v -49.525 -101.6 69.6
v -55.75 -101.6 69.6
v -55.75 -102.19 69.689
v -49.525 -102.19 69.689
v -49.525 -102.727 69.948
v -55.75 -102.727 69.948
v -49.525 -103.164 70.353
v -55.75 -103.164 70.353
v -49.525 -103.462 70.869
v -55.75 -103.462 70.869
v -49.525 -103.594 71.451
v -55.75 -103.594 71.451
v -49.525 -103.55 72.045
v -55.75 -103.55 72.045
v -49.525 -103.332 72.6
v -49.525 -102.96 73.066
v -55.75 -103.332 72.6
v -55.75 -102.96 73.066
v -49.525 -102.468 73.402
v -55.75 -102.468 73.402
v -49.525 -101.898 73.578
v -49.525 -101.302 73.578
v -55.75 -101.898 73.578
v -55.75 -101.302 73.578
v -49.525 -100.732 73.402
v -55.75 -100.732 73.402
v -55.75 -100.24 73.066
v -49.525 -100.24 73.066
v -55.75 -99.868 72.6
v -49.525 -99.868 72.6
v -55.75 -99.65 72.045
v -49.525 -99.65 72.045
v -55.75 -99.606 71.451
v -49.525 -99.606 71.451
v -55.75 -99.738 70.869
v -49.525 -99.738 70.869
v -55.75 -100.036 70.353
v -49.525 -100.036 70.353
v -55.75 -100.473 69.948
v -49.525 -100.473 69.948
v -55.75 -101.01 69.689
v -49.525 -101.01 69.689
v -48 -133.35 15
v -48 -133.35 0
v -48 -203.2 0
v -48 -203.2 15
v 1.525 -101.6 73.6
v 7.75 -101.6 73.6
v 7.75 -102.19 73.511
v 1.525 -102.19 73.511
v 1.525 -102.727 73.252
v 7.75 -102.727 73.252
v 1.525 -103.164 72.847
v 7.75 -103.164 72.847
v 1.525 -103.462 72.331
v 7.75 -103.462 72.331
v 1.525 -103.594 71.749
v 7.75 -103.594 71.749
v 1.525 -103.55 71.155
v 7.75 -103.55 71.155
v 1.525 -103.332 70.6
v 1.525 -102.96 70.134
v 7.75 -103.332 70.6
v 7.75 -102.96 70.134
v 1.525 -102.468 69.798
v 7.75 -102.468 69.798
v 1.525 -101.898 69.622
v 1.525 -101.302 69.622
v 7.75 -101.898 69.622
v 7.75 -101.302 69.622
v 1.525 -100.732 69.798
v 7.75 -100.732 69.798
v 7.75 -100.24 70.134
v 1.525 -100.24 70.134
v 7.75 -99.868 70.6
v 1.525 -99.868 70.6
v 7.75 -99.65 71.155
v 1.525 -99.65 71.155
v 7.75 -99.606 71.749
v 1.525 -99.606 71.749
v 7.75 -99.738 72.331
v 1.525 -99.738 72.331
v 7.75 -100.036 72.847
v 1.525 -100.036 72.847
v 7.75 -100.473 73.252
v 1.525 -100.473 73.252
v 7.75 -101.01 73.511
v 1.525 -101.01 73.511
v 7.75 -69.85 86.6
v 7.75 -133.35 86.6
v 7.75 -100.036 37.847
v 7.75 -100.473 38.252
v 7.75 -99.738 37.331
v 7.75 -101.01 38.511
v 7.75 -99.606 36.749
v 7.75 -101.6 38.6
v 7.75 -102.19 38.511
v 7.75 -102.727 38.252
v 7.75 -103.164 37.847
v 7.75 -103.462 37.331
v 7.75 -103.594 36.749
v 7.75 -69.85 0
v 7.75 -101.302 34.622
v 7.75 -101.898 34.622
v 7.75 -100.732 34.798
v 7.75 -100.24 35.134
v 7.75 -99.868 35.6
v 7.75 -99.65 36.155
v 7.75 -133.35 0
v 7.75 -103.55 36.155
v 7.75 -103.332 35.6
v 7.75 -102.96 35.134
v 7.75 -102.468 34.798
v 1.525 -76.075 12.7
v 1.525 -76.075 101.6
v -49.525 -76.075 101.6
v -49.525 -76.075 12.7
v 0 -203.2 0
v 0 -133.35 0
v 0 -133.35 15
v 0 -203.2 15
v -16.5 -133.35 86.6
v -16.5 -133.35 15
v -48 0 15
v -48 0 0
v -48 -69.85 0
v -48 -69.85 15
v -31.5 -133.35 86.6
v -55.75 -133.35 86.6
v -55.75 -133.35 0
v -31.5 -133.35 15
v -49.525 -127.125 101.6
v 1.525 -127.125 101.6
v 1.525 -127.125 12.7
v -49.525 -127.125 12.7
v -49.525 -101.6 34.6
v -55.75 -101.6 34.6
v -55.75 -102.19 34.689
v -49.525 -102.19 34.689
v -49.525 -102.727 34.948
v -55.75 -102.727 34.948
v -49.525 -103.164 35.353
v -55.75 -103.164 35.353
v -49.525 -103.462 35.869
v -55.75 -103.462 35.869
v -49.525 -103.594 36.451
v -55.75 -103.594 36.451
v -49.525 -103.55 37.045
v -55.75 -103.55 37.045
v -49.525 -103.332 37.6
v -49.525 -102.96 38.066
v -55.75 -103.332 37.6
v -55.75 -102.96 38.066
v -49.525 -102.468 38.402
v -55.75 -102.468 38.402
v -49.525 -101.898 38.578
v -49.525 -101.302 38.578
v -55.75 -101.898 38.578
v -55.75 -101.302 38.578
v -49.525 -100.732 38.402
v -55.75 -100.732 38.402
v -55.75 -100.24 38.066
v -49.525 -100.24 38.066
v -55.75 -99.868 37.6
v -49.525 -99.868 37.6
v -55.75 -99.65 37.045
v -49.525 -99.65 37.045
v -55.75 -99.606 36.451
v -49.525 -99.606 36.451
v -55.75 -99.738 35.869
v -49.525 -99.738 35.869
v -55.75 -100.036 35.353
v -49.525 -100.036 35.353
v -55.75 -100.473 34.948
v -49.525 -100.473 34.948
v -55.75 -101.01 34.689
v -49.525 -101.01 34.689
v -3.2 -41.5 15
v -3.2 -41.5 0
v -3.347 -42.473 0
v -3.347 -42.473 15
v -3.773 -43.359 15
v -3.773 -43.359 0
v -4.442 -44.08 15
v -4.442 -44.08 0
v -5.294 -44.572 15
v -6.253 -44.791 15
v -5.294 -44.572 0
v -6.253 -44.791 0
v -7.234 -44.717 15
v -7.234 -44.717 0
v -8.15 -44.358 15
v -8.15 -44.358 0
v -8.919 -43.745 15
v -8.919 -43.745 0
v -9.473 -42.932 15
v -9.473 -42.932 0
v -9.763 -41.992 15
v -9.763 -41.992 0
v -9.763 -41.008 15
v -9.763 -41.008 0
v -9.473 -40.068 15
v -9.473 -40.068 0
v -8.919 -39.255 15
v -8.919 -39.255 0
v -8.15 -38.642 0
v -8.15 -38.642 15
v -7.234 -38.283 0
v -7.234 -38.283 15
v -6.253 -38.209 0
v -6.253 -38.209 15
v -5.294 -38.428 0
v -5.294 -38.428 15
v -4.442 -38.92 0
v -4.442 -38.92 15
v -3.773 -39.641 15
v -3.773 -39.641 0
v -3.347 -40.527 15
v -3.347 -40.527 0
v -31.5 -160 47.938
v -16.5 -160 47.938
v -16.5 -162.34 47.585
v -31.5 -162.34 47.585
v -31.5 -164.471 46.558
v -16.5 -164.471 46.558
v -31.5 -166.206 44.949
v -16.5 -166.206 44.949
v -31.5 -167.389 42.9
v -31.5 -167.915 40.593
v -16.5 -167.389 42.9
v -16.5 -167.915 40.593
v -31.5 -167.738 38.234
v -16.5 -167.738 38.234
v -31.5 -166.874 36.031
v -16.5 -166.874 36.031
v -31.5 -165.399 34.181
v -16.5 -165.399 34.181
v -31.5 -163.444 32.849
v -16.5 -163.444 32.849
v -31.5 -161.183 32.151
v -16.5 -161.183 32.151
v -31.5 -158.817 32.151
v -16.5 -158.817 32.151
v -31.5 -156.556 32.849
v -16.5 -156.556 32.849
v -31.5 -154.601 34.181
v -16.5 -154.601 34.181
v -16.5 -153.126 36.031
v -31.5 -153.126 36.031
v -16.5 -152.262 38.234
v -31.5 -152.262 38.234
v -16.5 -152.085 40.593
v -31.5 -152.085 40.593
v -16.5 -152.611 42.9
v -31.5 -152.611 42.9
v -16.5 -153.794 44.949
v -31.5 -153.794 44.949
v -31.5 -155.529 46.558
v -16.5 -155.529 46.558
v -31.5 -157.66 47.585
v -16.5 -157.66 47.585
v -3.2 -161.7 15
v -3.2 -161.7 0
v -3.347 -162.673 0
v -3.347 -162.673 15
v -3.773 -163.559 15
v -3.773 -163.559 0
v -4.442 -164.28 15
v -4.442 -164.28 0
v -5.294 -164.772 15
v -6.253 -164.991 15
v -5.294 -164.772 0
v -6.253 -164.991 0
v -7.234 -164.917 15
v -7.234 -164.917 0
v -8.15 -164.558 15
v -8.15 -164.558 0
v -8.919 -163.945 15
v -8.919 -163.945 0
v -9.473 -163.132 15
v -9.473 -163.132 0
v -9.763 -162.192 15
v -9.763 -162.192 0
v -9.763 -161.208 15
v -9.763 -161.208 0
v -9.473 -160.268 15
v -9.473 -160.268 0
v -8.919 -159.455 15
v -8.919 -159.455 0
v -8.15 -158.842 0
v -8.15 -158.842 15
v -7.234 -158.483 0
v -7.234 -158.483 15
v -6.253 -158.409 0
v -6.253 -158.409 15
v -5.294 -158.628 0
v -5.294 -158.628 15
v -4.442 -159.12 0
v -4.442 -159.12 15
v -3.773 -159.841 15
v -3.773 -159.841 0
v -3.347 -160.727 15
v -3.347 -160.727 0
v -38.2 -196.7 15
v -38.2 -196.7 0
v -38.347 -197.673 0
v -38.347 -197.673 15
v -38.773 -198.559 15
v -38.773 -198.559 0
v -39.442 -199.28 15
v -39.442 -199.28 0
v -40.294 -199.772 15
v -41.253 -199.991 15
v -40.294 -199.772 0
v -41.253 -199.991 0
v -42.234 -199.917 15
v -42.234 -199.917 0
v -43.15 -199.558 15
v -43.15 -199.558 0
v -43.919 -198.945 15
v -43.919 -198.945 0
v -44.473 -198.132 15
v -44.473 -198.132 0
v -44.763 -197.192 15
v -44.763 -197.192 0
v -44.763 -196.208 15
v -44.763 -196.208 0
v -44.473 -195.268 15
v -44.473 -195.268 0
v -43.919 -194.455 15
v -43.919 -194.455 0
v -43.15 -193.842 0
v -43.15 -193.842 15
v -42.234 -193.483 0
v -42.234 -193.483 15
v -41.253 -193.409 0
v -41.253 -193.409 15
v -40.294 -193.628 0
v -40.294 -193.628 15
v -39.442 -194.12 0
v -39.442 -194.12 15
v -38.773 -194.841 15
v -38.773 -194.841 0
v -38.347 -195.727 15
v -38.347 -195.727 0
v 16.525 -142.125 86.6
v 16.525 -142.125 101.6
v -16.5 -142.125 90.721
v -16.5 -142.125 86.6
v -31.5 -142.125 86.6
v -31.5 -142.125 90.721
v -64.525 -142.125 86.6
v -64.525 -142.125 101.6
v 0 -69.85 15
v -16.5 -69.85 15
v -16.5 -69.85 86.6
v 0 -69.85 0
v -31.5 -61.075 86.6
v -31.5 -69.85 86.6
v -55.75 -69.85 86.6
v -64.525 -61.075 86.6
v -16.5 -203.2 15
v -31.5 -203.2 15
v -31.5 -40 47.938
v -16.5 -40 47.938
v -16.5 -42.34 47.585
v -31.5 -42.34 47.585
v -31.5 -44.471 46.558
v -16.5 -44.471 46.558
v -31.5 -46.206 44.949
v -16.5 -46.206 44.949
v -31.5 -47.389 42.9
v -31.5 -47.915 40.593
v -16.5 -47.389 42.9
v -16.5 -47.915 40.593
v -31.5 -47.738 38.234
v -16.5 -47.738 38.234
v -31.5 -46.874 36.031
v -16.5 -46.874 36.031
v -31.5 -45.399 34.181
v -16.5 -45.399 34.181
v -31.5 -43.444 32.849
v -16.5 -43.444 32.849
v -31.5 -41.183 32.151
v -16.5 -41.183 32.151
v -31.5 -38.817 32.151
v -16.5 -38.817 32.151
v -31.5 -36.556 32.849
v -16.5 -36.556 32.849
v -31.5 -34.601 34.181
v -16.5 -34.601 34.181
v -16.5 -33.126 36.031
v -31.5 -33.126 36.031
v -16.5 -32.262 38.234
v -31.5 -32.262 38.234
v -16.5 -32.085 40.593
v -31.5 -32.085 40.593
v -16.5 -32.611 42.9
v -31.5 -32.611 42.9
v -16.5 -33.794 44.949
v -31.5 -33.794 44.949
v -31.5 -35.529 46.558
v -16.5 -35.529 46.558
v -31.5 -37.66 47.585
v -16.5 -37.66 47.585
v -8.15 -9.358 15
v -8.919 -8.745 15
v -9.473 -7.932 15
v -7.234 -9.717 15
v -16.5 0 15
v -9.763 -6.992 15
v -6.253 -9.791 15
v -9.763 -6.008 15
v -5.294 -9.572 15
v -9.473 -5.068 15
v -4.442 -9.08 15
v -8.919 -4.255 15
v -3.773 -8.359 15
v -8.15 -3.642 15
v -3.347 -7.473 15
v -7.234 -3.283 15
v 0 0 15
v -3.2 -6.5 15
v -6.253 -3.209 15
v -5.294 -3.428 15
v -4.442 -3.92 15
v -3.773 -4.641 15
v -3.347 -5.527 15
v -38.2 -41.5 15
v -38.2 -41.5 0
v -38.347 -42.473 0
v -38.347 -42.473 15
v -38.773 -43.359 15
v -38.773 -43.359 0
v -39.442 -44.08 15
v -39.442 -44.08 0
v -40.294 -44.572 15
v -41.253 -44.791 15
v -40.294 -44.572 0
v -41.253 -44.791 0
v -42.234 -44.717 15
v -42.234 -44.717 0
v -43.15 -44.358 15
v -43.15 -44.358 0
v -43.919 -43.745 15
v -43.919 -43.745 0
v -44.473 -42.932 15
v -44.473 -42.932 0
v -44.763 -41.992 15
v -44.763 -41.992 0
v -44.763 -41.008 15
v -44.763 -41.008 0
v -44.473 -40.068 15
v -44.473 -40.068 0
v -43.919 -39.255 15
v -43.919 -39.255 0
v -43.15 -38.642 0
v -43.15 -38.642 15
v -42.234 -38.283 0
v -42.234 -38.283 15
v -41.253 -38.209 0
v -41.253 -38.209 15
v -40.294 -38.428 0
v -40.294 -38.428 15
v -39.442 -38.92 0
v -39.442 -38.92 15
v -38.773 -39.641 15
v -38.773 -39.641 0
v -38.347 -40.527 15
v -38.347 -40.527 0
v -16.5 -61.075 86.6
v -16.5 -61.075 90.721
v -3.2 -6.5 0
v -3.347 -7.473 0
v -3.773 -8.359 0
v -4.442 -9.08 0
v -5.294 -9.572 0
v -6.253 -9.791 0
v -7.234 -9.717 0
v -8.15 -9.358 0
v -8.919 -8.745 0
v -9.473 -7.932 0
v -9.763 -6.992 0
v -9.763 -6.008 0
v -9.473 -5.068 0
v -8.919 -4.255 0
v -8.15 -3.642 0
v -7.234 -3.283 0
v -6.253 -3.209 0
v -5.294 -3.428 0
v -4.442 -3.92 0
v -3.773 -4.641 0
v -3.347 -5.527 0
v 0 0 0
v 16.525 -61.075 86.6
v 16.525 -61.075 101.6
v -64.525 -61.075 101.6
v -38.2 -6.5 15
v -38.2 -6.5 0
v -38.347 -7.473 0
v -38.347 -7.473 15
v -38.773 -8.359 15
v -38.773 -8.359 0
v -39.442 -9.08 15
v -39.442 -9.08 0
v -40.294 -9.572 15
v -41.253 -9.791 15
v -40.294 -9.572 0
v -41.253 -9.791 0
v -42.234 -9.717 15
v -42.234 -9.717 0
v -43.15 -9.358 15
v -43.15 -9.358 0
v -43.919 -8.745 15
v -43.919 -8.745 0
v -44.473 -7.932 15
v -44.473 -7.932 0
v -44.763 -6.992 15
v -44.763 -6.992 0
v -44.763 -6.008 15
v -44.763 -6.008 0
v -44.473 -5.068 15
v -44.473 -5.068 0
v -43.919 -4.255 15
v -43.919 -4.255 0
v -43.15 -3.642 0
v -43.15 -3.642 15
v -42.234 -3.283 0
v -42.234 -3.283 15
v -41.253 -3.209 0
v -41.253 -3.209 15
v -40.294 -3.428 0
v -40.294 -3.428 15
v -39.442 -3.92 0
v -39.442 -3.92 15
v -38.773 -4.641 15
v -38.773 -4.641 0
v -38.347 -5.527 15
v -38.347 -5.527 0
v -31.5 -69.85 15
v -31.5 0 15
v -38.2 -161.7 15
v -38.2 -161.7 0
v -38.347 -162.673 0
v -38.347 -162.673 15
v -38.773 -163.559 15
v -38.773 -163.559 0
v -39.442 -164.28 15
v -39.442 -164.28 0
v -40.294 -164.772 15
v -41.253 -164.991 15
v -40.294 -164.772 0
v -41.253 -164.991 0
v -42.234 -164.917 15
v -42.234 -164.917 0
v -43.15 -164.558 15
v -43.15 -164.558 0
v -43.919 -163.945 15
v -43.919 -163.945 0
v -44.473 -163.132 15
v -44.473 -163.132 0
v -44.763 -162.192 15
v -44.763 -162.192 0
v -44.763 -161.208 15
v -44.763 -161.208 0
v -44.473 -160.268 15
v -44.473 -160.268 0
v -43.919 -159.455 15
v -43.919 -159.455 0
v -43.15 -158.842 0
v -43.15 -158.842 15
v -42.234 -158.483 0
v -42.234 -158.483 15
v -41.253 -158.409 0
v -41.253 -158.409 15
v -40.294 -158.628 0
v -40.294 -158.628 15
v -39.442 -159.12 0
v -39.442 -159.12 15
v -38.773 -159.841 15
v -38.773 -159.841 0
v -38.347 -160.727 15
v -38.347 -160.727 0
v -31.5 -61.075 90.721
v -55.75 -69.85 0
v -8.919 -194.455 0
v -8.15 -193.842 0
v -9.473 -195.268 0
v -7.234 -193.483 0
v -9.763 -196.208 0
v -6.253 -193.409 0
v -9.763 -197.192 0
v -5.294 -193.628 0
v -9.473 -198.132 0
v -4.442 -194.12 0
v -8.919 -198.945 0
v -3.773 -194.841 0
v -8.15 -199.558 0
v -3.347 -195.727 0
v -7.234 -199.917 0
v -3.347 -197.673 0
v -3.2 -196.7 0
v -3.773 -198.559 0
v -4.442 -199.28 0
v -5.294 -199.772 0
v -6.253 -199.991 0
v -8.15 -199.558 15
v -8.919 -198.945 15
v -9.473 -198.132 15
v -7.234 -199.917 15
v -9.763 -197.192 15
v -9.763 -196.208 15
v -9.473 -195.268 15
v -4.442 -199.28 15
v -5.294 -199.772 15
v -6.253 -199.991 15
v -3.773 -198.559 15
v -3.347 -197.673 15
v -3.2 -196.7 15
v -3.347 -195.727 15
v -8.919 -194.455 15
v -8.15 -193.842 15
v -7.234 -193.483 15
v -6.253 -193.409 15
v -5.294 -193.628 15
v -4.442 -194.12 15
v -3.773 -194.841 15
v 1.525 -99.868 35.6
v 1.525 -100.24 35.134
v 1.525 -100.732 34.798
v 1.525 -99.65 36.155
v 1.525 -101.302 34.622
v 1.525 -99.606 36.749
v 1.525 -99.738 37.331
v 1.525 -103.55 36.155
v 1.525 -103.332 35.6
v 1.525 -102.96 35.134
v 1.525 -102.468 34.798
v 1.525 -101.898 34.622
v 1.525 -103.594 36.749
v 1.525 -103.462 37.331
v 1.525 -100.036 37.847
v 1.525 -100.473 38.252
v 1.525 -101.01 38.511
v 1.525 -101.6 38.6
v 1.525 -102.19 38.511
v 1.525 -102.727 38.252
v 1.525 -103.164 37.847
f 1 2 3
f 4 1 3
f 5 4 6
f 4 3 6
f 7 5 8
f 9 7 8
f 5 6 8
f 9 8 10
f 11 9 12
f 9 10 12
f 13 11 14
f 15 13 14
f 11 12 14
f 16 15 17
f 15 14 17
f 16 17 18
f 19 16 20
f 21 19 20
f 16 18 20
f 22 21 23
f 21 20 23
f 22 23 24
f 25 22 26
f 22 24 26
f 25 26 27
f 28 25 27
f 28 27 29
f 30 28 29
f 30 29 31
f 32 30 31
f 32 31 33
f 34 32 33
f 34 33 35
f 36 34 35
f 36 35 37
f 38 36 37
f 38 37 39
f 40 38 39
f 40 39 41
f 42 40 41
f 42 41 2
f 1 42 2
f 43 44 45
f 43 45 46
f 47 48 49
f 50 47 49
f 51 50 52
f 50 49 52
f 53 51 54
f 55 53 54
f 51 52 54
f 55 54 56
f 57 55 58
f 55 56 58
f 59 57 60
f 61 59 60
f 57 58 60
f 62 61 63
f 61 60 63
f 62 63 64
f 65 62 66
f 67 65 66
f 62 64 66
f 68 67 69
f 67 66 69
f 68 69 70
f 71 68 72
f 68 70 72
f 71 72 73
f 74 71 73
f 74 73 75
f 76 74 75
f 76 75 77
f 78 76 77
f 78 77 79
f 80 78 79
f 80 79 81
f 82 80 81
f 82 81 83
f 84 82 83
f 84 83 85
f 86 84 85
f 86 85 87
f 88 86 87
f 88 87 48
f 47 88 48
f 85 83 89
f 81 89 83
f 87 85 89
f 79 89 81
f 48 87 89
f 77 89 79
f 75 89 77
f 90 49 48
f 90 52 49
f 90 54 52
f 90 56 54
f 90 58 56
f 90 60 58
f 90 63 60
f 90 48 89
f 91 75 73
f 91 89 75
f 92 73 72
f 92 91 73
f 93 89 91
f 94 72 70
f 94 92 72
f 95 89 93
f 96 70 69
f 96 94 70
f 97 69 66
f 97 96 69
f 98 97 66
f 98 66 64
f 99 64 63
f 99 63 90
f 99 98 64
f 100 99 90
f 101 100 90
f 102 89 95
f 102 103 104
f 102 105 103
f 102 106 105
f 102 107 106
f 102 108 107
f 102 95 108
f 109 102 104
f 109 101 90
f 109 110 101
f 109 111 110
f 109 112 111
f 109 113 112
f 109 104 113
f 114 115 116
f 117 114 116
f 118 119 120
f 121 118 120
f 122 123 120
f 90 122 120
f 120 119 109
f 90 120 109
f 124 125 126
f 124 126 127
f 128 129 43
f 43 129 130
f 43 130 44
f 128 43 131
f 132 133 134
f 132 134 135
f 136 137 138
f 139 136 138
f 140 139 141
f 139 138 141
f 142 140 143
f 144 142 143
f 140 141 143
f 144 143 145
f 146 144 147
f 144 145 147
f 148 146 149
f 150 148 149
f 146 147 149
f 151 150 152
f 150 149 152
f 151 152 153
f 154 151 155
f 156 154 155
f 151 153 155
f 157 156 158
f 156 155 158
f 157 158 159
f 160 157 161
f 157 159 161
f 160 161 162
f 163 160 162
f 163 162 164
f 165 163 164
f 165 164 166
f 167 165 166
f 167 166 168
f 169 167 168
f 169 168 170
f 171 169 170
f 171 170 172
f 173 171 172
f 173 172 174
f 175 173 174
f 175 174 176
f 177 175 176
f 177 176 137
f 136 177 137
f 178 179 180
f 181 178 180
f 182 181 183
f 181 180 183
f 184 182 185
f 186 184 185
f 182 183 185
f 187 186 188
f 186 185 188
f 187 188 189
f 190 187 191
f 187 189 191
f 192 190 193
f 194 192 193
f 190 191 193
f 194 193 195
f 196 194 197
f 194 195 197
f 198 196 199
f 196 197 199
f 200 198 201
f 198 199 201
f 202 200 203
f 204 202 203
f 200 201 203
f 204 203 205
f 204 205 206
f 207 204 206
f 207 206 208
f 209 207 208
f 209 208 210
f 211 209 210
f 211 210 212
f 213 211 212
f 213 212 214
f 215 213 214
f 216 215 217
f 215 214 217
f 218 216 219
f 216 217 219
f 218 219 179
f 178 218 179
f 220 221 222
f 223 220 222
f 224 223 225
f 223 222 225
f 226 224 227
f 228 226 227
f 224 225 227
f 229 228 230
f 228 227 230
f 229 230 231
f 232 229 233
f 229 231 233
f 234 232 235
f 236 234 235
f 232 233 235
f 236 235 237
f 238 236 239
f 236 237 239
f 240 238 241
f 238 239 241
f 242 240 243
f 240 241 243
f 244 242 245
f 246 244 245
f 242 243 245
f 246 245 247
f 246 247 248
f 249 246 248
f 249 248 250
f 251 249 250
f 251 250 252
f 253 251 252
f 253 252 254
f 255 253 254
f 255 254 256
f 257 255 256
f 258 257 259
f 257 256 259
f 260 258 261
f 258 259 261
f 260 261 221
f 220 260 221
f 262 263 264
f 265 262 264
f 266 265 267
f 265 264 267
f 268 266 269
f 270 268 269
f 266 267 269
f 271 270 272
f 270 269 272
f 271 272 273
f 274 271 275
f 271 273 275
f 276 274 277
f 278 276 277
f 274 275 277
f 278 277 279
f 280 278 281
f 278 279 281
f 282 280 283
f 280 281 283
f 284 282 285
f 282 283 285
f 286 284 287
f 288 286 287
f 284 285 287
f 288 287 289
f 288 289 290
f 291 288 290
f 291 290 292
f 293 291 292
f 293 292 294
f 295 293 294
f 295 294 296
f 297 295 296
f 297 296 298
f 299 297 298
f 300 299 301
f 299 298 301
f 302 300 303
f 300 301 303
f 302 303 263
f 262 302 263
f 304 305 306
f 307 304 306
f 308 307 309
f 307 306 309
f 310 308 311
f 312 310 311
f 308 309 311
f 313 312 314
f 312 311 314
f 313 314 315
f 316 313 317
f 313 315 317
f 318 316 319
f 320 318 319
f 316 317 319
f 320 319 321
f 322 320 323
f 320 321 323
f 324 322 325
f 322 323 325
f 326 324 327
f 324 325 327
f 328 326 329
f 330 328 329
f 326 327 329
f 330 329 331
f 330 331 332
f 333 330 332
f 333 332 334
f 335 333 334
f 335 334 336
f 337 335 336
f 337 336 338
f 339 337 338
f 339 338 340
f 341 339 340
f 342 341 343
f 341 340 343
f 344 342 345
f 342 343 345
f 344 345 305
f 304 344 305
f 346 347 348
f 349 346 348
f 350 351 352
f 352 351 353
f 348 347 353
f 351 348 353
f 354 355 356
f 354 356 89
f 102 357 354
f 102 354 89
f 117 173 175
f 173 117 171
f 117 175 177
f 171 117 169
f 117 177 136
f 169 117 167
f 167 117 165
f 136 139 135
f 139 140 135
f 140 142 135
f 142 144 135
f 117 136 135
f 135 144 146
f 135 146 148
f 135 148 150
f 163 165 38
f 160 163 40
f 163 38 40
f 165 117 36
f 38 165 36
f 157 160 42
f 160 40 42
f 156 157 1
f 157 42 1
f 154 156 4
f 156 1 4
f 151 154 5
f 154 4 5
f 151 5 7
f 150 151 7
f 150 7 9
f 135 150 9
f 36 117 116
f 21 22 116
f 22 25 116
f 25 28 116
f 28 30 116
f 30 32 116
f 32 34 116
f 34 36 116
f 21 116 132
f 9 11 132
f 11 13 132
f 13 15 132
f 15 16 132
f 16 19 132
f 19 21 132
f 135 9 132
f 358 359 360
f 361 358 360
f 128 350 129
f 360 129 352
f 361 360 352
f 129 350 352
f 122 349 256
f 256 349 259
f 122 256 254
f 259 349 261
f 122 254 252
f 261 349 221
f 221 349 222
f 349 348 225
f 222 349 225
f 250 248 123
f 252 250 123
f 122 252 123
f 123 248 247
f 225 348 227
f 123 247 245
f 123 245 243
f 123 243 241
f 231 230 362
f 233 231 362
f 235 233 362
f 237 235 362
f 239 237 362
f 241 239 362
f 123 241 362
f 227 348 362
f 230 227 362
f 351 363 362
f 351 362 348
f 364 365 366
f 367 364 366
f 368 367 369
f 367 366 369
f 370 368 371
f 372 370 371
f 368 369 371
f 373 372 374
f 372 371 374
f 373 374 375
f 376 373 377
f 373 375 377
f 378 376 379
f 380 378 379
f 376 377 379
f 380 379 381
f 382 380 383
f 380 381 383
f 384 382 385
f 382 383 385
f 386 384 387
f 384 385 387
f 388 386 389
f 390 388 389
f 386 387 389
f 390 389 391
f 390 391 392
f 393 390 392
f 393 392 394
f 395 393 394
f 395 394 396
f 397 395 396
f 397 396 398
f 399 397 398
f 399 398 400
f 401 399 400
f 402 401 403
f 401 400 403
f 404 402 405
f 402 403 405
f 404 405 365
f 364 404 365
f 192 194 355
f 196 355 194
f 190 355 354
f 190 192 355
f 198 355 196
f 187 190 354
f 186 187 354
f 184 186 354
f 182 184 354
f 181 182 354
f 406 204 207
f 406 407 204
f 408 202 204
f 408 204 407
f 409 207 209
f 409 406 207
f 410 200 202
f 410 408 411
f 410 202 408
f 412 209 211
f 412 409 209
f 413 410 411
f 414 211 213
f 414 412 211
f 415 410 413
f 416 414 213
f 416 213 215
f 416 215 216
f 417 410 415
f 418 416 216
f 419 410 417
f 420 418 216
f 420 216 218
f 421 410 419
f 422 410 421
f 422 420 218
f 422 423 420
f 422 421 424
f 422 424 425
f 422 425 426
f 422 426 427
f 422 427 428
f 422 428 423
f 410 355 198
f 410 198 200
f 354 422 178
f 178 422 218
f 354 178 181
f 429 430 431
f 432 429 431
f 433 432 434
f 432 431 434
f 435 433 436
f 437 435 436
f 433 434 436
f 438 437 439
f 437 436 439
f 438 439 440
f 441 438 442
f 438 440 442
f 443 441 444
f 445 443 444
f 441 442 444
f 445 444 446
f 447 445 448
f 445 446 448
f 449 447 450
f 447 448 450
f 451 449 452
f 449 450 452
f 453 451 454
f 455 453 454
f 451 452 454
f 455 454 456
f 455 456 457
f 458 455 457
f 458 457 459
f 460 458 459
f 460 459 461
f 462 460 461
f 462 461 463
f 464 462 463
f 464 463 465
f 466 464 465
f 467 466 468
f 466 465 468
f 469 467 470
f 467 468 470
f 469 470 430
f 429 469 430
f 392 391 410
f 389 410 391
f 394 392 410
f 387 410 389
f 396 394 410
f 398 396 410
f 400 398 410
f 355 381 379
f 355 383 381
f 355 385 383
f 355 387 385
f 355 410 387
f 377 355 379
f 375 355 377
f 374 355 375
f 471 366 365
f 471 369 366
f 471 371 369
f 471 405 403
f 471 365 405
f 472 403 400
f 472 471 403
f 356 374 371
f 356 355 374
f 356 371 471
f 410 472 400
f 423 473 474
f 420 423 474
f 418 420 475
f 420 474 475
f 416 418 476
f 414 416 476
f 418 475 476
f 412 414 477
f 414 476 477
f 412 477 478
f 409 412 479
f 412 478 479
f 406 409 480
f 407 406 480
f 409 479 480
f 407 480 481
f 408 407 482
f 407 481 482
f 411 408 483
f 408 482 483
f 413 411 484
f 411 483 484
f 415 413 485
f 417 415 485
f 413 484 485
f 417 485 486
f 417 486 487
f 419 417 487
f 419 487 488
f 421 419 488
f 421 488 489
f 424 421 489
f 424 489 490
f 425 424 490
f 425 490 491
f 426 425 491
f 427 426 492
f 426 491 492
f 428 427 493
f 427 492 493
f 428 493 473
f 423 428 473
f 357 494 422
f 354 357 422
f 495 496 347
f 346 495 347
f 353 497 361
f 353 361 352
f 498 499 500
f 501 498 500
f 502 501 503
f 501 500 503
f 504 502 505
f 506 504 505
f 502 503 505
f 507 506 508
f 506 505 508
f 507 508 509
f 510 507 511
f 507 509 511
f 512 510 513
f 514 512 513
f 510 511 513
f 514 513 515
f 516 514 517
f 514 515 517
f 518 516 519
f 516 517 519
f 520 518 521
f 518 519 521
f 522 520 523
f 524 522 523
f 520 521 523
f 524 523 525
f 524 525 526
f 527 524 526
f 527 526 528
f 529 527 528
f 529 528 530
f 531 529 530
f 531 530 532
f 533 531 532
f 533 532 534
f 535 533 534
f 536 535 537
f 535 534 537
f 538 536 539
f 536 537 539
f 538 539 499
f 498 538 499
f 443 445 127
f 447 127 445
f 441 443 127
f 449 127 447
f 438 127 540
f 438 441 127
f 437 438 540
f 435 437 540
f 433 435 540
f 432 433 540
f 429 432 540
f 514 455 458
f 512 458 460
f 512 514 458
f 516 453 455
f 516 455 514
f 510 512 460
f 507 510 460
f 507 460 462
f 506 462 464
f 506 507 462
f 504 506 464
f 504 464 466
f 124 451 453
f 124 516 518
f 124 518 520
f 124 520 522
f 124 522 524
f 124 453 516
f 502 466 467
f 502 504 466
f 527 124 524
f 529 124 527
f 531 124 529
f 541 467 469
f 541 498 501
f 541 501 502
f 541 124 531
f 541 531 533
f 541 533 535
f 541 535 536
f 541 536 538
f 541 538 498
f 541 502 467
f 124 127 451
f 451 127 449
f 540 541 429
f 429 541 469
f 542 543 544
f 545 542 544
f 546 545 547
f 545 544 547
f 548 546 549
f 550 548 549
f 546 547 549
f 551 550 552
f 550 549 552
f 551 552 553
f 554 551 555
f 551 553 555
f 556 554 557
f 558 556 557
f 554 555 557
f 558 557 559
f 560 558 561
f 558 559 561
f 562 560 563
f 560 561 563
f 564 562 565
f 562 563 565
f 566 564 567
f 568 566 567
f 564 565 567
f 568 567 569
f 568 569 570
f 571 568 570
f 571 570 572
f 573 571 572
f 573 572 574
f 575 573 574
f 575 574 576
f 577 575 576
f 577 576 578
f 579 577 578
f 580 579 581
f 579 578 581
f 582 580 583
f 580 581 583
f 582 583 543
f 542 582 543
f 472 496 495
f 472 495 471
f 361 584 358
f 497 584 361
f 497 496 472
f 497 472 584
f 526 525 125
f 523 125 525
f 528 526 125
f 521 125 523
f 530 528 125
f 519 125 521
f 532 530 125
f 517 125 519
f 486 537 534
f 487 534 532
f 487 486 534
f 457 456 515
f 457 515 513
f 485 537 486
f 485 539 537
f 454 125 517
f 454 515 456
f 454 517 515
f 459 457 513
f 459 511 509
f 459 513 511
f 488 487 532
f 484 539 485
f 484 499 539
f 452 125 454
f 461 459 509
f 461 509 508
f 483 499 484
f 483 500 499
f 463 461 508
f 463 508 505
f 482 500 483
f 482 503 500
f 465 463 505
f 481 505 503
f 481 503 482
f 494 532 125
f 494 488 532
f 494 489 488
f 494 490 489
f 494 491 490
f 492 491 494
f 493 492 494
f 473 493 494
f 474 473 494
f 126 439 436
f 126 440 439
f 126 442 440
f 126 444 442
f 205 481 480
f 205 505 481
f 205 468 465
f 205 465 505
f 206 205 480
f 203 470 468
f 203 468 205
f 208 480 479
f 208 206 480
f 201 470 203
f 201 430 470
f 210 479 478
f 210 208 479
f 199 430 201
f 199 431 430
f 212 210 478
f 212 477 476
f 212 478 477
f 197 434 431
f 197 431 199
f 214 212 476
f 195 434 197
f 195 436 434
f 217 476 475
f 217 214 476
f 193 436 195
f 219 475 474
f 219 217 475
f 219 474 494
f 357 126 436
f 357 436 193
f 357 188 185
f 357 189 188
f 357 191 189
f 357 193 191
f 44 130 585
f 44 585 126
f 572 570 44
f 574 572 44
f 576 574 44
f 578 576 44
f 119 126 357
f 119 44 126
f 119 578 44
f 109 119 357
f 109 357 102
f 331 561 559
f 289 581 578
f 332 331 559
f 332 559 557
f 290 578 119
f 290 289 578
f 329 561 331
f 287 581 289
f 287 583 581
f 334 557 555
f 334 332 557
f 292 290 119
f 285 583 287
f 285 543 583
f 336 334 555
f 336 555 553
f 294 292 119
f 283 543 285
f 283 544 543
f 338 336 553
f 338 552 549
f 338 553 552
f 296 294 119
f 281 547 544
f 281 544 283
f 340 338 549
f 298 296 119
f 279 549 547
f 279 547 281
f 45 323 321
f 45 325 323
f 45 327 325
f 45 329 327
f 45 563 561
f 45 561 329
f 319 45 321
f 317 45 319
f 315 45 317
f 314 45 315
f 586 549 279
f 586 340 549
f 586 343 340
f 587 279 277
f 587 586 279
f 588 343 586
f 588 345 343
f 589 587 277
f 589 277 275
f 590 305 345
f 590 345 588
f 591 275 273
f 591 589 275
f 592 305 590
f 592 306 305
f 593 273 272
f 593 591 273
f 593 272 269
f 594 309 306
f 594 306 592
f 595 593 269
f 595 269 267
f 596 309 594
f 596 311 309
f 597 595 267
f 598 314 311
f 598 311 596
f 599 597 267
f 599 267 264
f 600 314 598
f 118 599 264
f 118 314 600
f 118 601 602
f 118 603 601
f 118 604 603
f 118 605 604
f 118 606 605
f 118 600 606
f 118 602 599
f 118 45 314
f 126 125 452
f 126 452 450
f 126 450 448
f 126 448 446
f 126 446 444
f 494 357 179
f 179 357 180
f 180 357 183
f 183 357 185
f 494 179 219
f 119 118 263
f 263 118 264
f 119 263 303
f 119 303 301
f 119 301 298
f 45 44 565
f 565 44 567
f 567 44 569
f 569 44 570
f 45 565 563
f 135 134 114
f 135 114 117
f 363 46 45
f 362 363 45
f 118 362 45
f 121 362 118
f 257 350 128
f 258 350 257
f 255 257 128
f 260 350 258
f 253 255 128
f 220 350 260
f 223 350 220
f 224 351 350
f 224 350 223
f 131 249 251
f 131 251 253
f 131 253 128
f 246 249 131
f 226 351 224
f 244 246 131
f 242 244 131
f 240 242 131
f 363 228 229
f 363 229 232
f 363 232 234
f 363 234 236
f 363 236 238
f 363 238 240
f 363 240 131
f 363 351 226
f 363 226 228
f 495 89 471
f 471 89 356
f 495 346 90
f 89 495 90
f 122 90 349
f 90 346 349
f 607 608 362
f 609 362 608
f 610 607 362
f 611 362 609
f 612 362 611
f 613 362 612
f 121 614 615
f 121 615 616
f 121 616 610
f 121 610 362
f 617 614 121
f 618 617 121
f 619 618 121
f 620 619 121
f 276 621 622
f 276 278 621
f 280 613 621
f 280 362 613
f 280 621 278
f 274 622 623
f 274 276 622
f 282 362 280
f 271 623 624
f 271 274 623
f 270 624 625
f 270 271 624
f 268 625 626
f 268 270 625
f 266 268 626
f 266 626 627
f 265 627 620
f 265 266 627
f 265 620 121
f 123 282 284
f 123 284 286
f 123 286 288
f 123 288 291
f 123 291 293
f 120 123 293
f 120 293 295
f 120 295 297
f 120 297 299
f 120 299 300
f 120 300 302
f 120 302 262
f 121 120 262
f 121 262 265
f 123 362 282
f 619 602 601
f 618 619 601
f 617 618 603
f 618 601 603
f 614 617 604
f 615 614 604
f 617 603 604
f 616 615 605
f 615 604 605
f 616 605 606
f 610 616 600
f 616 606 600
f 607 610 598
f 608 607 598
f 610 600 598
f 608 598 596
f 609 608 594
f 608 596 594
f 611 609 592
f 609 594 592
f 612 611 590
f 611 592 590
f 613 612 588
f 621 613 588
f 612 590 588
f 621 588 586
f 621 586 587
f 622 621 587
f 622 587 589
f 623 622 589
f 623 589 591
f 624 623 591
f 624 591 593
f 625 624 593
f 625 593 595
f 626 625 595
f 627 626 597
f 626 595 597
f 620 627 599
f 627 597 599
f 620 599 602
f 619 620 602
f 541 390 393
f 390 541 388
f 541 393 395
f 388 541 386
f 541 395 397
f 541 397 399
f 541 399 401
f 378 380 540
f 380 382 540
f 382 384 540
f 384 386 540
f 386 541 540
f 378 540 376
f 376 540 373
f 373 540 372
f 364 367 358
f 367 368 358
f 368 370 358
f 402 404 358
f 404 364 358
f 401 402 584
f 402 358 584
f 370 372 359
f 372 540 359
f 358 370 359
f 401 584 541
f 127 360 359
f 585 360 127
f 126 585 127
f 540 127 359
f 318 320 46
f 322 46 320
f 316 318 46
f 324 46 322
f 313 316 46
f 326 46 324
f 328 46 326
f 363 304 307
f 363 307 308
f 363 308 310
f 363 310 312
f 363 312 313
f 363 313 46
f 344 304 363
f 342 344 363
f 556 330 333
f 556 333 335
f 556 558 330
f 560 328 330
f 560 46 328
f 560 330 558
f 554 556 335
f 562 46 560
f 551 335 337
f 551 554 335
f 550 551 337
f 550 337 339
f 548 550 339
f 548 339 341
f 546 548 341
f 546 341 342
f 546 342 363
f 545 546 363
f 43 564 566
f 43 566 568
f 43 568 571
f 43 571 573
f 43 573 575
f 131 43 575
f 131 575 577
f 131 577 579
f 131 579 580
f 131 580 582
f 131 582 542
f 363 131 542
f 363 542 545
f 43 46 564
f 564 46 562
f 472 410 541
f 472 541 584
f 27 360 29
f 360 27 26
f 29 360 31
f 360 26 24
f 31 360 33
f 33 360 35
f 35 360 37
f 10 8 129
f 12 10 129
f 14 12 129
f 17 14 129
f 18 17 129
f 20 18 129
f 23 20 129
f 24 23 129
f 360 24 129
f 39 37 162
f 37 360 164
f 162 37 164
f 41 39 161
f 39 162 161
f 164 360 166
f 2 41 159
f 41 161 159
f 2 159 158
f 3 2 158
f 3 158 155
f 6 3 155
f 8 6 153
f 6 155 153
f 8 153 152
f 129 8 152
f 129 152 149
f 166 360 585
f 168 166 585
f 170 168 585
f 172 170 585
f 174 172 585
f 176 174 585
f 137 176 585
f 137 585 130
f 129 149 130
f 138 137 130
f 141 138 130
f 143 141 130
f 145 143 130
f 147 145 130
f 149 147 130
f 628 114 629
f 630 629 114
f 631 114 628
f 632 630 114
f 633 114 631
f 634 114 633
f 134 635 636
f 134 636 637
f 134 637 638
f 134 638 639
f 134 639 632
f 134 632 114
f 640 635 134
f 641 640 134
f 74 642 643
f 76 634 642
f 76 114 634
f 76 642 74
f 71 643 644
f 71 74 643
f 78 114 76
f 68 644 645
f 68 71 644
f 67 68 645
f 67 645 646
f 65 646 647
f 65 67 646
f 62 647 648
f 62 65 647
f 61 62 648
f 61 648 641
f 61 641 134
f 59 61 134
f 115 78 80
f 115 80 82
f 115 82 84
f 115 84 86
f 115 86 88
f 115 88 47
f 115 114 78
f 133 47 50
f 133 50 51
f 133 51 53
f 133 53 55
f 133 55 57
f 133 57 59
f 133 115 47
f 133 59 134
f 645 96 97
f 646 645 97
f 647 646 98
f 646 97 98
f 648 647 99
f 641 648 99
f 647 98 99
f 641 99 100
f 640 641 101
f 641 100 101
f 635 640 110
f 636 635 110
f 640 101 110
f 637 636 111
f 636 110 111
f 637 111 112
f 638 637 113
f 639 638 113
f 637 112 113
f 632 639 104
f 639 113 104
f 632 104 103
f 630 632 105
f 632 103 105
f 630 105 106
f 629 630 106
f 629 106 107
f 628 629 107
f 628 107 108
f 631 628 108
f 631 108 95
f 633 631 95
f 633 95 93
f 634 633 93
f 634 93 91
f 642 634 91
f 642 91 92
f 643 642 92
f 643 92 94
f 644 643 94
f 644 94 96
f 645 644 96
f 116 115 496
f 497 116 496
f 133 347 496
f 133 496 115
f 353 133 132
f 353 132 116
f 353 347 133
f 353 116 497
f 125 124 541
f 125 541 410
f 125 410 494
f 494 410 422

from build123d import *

# Parameters (mm, degrees)
SKETCH_W        = 48
SKETCH_H        = 15
PAD_DEPTH       = 203.2
SKETCH001_R     = 3.3
POCKET_DEPTH    = 15
SKETCH002_W     = 63.5
SKETCH002_H     = 63.5
PAD001_DEPTH    = 101.6
SKETCH003_W     = 51.05
SKETCH003_H     = 51.05
POCKET001_DEPTH = 88.9
SKETCH004_R     = 2
POCKET002_DEPTH = 15
SKETCH005_R     = 2
POCKET003_DEPTH = 15
PAD002_DEPTH    = 7.5
SKETCH007_W     = 81.05
SKETCH007_H     = 81.05
SKETCH007_W_2   = 51.05
SKETCH007_H_2   = 51.05
PAD003_DEPTH    = 15
SKETCH008_R     = 7.9375
POCKET004_DEPTH = 15


with BuildPart() as part:
    # Sketch → Pad (new body)
    with BuildSketch(Plane.XZ):
        with Locations((-24, 7.5)):
            Rectangle(SKETCH_W, SKETCH_H)
    extrude(amount=PAD_DEPTH)

    # Sketch001 (on Face4 of Pad) → Pocket (cut)
    with BuildSketch(Plane(origin=(0, 0, 0), x_dir=(1, 0, 0), z_dir=(0, 0, -1))):
        with Locations((-41.5, 41.5)):
            Circle(SKETCH001_R)
        with Locations((-6.5, 41.5)):
            Circle(SKETCH001_R)
        with Locations((-41.5, 6.5)):
            Circle(SKETCH001_R)
        with Locations((-6.5, 6.5)):
            Circle(SKETCH001_R)
        with Locations((-41.5, 196.7)):
            Circle(SKETCH001_R)
        with Locations((-6.5, 196.7)):
            Circle(SKETCH001_R)
        with Locations((-41.5, 161.7)):
            Circle(SKETCH001_R)
        with Locations((-6.5, 161.7)):
            Circle(SKETCH001_R)
    extrude(amount=-POCKET_DEPTH, mode=Mode.SUBTRACT)

    # Sketch002 (on Face2 of Pocket) → Pad001 (join)
    with BuildSketch(Plane(origin=(0, 0, 0), x_dir=(1, 0, 0), z_dir=(0, 0, -1))):
        with Locations((-24, 101.6)):
            Rectangle(SKETCH002_W, SKETCH002_H)
    extrude(amount=-PAD001_DEPTH)

    # Sketch003 (on Face11 of Pad001) → Pocket001 (cut)
    with BuildSketch(Plane(origin=(0, 0, 101.6), x_dir=(-1, 0, 0), z_dir=(0, 0, 1))):
        with Locations((24, 101.6)):
            Rectangle(SKETCH003_W, SKETCH003_H)
    extrude(amount=-POCKET001_DEPTH, mode=Mode.SUBTRACT)

    # Sketch004 (on Face11 of Pocket001) → Pocket002 (cut)
    with BuildSketch(Plane(origin=(7.75, 0, 0), x_dir=(0, 0, 1), z_dir=(1, 0, 0))):
        with Locations((71.6, 101.6)):
            Circle(SKETCH004_R)
        with Locations((36.6, 101.6)):
            Circle(SKETCH004_R)
    extrude(amount=-POCKET002_DEPTH, mode=Mode.SUBTRACT)

    # Sketch005 (on Face13 of Pocket002) → Pocket003 (cut)
    with BuildSketch(Plane(origin=(-55.75, 0, 0), x_dir=(0, 0, -1), z_dir=(-1, 0, 0))):
        with Locations((-71.6, 101.6)):
            Circle(SKETCH005_R)
        with Locations((-36.6, 101.6)):
            Circle(SKETCH005_R)
    extrude(amount=-POCKET003_DEPTH, mode=Mode.SUBTRACT)

    # Sketch006 (on Face11 of Pocket003) → Pad002 (join, symmetric)
    with BuildSketch(Plane(origin=(-24, 0, 0), x_dir=(0, 0, 1), z_dir=(1, 0, 0))):
        Polygon((15, 133.35), (15, 203.2), (101.6, 133.35), align=None)
        Polygon((101.6, 69.85), (15, 69.85), (15, 0), align=None)
    extrude(amount=PAD002_DEPTH, both=True)

    # Sketch007 (on Face13 of Pad002) → Pad003 (join)
    with BuildSketch(Plane(origin=(0, 0, 101.6), x_dir=(-1, 0, 0), z_dir=(0, 0, 1))):
        with Locations((24, 101.6)):
            Rectangle(SKETCH007_W, SKETCH007_H)
        with Locations((24, 101.6)):
            Rectangle(SKETCH007_W_2, SKETCH007_H_2, mode=Mode.SUBTRACT)
    extrude(amount=-PAD003_DEPTH)

    # Sketch008 (on Face34 of Pad003) → Pocket004 (cut)
    with BuildSketch(Plane(origin=(-16.5, 0, 0), x_dir=(0, 0, 1), z_dir=(1, 0, 0))):
        with Locations((40, 160)):
            Circle(SKETCH008_R)
        with Locations((40, 40)):
            Circle(SKETCH008_R)
    extrude(amount=-POCKET004_DEPTH, mode=Mode.SUBTRACT)


solid = part.part
